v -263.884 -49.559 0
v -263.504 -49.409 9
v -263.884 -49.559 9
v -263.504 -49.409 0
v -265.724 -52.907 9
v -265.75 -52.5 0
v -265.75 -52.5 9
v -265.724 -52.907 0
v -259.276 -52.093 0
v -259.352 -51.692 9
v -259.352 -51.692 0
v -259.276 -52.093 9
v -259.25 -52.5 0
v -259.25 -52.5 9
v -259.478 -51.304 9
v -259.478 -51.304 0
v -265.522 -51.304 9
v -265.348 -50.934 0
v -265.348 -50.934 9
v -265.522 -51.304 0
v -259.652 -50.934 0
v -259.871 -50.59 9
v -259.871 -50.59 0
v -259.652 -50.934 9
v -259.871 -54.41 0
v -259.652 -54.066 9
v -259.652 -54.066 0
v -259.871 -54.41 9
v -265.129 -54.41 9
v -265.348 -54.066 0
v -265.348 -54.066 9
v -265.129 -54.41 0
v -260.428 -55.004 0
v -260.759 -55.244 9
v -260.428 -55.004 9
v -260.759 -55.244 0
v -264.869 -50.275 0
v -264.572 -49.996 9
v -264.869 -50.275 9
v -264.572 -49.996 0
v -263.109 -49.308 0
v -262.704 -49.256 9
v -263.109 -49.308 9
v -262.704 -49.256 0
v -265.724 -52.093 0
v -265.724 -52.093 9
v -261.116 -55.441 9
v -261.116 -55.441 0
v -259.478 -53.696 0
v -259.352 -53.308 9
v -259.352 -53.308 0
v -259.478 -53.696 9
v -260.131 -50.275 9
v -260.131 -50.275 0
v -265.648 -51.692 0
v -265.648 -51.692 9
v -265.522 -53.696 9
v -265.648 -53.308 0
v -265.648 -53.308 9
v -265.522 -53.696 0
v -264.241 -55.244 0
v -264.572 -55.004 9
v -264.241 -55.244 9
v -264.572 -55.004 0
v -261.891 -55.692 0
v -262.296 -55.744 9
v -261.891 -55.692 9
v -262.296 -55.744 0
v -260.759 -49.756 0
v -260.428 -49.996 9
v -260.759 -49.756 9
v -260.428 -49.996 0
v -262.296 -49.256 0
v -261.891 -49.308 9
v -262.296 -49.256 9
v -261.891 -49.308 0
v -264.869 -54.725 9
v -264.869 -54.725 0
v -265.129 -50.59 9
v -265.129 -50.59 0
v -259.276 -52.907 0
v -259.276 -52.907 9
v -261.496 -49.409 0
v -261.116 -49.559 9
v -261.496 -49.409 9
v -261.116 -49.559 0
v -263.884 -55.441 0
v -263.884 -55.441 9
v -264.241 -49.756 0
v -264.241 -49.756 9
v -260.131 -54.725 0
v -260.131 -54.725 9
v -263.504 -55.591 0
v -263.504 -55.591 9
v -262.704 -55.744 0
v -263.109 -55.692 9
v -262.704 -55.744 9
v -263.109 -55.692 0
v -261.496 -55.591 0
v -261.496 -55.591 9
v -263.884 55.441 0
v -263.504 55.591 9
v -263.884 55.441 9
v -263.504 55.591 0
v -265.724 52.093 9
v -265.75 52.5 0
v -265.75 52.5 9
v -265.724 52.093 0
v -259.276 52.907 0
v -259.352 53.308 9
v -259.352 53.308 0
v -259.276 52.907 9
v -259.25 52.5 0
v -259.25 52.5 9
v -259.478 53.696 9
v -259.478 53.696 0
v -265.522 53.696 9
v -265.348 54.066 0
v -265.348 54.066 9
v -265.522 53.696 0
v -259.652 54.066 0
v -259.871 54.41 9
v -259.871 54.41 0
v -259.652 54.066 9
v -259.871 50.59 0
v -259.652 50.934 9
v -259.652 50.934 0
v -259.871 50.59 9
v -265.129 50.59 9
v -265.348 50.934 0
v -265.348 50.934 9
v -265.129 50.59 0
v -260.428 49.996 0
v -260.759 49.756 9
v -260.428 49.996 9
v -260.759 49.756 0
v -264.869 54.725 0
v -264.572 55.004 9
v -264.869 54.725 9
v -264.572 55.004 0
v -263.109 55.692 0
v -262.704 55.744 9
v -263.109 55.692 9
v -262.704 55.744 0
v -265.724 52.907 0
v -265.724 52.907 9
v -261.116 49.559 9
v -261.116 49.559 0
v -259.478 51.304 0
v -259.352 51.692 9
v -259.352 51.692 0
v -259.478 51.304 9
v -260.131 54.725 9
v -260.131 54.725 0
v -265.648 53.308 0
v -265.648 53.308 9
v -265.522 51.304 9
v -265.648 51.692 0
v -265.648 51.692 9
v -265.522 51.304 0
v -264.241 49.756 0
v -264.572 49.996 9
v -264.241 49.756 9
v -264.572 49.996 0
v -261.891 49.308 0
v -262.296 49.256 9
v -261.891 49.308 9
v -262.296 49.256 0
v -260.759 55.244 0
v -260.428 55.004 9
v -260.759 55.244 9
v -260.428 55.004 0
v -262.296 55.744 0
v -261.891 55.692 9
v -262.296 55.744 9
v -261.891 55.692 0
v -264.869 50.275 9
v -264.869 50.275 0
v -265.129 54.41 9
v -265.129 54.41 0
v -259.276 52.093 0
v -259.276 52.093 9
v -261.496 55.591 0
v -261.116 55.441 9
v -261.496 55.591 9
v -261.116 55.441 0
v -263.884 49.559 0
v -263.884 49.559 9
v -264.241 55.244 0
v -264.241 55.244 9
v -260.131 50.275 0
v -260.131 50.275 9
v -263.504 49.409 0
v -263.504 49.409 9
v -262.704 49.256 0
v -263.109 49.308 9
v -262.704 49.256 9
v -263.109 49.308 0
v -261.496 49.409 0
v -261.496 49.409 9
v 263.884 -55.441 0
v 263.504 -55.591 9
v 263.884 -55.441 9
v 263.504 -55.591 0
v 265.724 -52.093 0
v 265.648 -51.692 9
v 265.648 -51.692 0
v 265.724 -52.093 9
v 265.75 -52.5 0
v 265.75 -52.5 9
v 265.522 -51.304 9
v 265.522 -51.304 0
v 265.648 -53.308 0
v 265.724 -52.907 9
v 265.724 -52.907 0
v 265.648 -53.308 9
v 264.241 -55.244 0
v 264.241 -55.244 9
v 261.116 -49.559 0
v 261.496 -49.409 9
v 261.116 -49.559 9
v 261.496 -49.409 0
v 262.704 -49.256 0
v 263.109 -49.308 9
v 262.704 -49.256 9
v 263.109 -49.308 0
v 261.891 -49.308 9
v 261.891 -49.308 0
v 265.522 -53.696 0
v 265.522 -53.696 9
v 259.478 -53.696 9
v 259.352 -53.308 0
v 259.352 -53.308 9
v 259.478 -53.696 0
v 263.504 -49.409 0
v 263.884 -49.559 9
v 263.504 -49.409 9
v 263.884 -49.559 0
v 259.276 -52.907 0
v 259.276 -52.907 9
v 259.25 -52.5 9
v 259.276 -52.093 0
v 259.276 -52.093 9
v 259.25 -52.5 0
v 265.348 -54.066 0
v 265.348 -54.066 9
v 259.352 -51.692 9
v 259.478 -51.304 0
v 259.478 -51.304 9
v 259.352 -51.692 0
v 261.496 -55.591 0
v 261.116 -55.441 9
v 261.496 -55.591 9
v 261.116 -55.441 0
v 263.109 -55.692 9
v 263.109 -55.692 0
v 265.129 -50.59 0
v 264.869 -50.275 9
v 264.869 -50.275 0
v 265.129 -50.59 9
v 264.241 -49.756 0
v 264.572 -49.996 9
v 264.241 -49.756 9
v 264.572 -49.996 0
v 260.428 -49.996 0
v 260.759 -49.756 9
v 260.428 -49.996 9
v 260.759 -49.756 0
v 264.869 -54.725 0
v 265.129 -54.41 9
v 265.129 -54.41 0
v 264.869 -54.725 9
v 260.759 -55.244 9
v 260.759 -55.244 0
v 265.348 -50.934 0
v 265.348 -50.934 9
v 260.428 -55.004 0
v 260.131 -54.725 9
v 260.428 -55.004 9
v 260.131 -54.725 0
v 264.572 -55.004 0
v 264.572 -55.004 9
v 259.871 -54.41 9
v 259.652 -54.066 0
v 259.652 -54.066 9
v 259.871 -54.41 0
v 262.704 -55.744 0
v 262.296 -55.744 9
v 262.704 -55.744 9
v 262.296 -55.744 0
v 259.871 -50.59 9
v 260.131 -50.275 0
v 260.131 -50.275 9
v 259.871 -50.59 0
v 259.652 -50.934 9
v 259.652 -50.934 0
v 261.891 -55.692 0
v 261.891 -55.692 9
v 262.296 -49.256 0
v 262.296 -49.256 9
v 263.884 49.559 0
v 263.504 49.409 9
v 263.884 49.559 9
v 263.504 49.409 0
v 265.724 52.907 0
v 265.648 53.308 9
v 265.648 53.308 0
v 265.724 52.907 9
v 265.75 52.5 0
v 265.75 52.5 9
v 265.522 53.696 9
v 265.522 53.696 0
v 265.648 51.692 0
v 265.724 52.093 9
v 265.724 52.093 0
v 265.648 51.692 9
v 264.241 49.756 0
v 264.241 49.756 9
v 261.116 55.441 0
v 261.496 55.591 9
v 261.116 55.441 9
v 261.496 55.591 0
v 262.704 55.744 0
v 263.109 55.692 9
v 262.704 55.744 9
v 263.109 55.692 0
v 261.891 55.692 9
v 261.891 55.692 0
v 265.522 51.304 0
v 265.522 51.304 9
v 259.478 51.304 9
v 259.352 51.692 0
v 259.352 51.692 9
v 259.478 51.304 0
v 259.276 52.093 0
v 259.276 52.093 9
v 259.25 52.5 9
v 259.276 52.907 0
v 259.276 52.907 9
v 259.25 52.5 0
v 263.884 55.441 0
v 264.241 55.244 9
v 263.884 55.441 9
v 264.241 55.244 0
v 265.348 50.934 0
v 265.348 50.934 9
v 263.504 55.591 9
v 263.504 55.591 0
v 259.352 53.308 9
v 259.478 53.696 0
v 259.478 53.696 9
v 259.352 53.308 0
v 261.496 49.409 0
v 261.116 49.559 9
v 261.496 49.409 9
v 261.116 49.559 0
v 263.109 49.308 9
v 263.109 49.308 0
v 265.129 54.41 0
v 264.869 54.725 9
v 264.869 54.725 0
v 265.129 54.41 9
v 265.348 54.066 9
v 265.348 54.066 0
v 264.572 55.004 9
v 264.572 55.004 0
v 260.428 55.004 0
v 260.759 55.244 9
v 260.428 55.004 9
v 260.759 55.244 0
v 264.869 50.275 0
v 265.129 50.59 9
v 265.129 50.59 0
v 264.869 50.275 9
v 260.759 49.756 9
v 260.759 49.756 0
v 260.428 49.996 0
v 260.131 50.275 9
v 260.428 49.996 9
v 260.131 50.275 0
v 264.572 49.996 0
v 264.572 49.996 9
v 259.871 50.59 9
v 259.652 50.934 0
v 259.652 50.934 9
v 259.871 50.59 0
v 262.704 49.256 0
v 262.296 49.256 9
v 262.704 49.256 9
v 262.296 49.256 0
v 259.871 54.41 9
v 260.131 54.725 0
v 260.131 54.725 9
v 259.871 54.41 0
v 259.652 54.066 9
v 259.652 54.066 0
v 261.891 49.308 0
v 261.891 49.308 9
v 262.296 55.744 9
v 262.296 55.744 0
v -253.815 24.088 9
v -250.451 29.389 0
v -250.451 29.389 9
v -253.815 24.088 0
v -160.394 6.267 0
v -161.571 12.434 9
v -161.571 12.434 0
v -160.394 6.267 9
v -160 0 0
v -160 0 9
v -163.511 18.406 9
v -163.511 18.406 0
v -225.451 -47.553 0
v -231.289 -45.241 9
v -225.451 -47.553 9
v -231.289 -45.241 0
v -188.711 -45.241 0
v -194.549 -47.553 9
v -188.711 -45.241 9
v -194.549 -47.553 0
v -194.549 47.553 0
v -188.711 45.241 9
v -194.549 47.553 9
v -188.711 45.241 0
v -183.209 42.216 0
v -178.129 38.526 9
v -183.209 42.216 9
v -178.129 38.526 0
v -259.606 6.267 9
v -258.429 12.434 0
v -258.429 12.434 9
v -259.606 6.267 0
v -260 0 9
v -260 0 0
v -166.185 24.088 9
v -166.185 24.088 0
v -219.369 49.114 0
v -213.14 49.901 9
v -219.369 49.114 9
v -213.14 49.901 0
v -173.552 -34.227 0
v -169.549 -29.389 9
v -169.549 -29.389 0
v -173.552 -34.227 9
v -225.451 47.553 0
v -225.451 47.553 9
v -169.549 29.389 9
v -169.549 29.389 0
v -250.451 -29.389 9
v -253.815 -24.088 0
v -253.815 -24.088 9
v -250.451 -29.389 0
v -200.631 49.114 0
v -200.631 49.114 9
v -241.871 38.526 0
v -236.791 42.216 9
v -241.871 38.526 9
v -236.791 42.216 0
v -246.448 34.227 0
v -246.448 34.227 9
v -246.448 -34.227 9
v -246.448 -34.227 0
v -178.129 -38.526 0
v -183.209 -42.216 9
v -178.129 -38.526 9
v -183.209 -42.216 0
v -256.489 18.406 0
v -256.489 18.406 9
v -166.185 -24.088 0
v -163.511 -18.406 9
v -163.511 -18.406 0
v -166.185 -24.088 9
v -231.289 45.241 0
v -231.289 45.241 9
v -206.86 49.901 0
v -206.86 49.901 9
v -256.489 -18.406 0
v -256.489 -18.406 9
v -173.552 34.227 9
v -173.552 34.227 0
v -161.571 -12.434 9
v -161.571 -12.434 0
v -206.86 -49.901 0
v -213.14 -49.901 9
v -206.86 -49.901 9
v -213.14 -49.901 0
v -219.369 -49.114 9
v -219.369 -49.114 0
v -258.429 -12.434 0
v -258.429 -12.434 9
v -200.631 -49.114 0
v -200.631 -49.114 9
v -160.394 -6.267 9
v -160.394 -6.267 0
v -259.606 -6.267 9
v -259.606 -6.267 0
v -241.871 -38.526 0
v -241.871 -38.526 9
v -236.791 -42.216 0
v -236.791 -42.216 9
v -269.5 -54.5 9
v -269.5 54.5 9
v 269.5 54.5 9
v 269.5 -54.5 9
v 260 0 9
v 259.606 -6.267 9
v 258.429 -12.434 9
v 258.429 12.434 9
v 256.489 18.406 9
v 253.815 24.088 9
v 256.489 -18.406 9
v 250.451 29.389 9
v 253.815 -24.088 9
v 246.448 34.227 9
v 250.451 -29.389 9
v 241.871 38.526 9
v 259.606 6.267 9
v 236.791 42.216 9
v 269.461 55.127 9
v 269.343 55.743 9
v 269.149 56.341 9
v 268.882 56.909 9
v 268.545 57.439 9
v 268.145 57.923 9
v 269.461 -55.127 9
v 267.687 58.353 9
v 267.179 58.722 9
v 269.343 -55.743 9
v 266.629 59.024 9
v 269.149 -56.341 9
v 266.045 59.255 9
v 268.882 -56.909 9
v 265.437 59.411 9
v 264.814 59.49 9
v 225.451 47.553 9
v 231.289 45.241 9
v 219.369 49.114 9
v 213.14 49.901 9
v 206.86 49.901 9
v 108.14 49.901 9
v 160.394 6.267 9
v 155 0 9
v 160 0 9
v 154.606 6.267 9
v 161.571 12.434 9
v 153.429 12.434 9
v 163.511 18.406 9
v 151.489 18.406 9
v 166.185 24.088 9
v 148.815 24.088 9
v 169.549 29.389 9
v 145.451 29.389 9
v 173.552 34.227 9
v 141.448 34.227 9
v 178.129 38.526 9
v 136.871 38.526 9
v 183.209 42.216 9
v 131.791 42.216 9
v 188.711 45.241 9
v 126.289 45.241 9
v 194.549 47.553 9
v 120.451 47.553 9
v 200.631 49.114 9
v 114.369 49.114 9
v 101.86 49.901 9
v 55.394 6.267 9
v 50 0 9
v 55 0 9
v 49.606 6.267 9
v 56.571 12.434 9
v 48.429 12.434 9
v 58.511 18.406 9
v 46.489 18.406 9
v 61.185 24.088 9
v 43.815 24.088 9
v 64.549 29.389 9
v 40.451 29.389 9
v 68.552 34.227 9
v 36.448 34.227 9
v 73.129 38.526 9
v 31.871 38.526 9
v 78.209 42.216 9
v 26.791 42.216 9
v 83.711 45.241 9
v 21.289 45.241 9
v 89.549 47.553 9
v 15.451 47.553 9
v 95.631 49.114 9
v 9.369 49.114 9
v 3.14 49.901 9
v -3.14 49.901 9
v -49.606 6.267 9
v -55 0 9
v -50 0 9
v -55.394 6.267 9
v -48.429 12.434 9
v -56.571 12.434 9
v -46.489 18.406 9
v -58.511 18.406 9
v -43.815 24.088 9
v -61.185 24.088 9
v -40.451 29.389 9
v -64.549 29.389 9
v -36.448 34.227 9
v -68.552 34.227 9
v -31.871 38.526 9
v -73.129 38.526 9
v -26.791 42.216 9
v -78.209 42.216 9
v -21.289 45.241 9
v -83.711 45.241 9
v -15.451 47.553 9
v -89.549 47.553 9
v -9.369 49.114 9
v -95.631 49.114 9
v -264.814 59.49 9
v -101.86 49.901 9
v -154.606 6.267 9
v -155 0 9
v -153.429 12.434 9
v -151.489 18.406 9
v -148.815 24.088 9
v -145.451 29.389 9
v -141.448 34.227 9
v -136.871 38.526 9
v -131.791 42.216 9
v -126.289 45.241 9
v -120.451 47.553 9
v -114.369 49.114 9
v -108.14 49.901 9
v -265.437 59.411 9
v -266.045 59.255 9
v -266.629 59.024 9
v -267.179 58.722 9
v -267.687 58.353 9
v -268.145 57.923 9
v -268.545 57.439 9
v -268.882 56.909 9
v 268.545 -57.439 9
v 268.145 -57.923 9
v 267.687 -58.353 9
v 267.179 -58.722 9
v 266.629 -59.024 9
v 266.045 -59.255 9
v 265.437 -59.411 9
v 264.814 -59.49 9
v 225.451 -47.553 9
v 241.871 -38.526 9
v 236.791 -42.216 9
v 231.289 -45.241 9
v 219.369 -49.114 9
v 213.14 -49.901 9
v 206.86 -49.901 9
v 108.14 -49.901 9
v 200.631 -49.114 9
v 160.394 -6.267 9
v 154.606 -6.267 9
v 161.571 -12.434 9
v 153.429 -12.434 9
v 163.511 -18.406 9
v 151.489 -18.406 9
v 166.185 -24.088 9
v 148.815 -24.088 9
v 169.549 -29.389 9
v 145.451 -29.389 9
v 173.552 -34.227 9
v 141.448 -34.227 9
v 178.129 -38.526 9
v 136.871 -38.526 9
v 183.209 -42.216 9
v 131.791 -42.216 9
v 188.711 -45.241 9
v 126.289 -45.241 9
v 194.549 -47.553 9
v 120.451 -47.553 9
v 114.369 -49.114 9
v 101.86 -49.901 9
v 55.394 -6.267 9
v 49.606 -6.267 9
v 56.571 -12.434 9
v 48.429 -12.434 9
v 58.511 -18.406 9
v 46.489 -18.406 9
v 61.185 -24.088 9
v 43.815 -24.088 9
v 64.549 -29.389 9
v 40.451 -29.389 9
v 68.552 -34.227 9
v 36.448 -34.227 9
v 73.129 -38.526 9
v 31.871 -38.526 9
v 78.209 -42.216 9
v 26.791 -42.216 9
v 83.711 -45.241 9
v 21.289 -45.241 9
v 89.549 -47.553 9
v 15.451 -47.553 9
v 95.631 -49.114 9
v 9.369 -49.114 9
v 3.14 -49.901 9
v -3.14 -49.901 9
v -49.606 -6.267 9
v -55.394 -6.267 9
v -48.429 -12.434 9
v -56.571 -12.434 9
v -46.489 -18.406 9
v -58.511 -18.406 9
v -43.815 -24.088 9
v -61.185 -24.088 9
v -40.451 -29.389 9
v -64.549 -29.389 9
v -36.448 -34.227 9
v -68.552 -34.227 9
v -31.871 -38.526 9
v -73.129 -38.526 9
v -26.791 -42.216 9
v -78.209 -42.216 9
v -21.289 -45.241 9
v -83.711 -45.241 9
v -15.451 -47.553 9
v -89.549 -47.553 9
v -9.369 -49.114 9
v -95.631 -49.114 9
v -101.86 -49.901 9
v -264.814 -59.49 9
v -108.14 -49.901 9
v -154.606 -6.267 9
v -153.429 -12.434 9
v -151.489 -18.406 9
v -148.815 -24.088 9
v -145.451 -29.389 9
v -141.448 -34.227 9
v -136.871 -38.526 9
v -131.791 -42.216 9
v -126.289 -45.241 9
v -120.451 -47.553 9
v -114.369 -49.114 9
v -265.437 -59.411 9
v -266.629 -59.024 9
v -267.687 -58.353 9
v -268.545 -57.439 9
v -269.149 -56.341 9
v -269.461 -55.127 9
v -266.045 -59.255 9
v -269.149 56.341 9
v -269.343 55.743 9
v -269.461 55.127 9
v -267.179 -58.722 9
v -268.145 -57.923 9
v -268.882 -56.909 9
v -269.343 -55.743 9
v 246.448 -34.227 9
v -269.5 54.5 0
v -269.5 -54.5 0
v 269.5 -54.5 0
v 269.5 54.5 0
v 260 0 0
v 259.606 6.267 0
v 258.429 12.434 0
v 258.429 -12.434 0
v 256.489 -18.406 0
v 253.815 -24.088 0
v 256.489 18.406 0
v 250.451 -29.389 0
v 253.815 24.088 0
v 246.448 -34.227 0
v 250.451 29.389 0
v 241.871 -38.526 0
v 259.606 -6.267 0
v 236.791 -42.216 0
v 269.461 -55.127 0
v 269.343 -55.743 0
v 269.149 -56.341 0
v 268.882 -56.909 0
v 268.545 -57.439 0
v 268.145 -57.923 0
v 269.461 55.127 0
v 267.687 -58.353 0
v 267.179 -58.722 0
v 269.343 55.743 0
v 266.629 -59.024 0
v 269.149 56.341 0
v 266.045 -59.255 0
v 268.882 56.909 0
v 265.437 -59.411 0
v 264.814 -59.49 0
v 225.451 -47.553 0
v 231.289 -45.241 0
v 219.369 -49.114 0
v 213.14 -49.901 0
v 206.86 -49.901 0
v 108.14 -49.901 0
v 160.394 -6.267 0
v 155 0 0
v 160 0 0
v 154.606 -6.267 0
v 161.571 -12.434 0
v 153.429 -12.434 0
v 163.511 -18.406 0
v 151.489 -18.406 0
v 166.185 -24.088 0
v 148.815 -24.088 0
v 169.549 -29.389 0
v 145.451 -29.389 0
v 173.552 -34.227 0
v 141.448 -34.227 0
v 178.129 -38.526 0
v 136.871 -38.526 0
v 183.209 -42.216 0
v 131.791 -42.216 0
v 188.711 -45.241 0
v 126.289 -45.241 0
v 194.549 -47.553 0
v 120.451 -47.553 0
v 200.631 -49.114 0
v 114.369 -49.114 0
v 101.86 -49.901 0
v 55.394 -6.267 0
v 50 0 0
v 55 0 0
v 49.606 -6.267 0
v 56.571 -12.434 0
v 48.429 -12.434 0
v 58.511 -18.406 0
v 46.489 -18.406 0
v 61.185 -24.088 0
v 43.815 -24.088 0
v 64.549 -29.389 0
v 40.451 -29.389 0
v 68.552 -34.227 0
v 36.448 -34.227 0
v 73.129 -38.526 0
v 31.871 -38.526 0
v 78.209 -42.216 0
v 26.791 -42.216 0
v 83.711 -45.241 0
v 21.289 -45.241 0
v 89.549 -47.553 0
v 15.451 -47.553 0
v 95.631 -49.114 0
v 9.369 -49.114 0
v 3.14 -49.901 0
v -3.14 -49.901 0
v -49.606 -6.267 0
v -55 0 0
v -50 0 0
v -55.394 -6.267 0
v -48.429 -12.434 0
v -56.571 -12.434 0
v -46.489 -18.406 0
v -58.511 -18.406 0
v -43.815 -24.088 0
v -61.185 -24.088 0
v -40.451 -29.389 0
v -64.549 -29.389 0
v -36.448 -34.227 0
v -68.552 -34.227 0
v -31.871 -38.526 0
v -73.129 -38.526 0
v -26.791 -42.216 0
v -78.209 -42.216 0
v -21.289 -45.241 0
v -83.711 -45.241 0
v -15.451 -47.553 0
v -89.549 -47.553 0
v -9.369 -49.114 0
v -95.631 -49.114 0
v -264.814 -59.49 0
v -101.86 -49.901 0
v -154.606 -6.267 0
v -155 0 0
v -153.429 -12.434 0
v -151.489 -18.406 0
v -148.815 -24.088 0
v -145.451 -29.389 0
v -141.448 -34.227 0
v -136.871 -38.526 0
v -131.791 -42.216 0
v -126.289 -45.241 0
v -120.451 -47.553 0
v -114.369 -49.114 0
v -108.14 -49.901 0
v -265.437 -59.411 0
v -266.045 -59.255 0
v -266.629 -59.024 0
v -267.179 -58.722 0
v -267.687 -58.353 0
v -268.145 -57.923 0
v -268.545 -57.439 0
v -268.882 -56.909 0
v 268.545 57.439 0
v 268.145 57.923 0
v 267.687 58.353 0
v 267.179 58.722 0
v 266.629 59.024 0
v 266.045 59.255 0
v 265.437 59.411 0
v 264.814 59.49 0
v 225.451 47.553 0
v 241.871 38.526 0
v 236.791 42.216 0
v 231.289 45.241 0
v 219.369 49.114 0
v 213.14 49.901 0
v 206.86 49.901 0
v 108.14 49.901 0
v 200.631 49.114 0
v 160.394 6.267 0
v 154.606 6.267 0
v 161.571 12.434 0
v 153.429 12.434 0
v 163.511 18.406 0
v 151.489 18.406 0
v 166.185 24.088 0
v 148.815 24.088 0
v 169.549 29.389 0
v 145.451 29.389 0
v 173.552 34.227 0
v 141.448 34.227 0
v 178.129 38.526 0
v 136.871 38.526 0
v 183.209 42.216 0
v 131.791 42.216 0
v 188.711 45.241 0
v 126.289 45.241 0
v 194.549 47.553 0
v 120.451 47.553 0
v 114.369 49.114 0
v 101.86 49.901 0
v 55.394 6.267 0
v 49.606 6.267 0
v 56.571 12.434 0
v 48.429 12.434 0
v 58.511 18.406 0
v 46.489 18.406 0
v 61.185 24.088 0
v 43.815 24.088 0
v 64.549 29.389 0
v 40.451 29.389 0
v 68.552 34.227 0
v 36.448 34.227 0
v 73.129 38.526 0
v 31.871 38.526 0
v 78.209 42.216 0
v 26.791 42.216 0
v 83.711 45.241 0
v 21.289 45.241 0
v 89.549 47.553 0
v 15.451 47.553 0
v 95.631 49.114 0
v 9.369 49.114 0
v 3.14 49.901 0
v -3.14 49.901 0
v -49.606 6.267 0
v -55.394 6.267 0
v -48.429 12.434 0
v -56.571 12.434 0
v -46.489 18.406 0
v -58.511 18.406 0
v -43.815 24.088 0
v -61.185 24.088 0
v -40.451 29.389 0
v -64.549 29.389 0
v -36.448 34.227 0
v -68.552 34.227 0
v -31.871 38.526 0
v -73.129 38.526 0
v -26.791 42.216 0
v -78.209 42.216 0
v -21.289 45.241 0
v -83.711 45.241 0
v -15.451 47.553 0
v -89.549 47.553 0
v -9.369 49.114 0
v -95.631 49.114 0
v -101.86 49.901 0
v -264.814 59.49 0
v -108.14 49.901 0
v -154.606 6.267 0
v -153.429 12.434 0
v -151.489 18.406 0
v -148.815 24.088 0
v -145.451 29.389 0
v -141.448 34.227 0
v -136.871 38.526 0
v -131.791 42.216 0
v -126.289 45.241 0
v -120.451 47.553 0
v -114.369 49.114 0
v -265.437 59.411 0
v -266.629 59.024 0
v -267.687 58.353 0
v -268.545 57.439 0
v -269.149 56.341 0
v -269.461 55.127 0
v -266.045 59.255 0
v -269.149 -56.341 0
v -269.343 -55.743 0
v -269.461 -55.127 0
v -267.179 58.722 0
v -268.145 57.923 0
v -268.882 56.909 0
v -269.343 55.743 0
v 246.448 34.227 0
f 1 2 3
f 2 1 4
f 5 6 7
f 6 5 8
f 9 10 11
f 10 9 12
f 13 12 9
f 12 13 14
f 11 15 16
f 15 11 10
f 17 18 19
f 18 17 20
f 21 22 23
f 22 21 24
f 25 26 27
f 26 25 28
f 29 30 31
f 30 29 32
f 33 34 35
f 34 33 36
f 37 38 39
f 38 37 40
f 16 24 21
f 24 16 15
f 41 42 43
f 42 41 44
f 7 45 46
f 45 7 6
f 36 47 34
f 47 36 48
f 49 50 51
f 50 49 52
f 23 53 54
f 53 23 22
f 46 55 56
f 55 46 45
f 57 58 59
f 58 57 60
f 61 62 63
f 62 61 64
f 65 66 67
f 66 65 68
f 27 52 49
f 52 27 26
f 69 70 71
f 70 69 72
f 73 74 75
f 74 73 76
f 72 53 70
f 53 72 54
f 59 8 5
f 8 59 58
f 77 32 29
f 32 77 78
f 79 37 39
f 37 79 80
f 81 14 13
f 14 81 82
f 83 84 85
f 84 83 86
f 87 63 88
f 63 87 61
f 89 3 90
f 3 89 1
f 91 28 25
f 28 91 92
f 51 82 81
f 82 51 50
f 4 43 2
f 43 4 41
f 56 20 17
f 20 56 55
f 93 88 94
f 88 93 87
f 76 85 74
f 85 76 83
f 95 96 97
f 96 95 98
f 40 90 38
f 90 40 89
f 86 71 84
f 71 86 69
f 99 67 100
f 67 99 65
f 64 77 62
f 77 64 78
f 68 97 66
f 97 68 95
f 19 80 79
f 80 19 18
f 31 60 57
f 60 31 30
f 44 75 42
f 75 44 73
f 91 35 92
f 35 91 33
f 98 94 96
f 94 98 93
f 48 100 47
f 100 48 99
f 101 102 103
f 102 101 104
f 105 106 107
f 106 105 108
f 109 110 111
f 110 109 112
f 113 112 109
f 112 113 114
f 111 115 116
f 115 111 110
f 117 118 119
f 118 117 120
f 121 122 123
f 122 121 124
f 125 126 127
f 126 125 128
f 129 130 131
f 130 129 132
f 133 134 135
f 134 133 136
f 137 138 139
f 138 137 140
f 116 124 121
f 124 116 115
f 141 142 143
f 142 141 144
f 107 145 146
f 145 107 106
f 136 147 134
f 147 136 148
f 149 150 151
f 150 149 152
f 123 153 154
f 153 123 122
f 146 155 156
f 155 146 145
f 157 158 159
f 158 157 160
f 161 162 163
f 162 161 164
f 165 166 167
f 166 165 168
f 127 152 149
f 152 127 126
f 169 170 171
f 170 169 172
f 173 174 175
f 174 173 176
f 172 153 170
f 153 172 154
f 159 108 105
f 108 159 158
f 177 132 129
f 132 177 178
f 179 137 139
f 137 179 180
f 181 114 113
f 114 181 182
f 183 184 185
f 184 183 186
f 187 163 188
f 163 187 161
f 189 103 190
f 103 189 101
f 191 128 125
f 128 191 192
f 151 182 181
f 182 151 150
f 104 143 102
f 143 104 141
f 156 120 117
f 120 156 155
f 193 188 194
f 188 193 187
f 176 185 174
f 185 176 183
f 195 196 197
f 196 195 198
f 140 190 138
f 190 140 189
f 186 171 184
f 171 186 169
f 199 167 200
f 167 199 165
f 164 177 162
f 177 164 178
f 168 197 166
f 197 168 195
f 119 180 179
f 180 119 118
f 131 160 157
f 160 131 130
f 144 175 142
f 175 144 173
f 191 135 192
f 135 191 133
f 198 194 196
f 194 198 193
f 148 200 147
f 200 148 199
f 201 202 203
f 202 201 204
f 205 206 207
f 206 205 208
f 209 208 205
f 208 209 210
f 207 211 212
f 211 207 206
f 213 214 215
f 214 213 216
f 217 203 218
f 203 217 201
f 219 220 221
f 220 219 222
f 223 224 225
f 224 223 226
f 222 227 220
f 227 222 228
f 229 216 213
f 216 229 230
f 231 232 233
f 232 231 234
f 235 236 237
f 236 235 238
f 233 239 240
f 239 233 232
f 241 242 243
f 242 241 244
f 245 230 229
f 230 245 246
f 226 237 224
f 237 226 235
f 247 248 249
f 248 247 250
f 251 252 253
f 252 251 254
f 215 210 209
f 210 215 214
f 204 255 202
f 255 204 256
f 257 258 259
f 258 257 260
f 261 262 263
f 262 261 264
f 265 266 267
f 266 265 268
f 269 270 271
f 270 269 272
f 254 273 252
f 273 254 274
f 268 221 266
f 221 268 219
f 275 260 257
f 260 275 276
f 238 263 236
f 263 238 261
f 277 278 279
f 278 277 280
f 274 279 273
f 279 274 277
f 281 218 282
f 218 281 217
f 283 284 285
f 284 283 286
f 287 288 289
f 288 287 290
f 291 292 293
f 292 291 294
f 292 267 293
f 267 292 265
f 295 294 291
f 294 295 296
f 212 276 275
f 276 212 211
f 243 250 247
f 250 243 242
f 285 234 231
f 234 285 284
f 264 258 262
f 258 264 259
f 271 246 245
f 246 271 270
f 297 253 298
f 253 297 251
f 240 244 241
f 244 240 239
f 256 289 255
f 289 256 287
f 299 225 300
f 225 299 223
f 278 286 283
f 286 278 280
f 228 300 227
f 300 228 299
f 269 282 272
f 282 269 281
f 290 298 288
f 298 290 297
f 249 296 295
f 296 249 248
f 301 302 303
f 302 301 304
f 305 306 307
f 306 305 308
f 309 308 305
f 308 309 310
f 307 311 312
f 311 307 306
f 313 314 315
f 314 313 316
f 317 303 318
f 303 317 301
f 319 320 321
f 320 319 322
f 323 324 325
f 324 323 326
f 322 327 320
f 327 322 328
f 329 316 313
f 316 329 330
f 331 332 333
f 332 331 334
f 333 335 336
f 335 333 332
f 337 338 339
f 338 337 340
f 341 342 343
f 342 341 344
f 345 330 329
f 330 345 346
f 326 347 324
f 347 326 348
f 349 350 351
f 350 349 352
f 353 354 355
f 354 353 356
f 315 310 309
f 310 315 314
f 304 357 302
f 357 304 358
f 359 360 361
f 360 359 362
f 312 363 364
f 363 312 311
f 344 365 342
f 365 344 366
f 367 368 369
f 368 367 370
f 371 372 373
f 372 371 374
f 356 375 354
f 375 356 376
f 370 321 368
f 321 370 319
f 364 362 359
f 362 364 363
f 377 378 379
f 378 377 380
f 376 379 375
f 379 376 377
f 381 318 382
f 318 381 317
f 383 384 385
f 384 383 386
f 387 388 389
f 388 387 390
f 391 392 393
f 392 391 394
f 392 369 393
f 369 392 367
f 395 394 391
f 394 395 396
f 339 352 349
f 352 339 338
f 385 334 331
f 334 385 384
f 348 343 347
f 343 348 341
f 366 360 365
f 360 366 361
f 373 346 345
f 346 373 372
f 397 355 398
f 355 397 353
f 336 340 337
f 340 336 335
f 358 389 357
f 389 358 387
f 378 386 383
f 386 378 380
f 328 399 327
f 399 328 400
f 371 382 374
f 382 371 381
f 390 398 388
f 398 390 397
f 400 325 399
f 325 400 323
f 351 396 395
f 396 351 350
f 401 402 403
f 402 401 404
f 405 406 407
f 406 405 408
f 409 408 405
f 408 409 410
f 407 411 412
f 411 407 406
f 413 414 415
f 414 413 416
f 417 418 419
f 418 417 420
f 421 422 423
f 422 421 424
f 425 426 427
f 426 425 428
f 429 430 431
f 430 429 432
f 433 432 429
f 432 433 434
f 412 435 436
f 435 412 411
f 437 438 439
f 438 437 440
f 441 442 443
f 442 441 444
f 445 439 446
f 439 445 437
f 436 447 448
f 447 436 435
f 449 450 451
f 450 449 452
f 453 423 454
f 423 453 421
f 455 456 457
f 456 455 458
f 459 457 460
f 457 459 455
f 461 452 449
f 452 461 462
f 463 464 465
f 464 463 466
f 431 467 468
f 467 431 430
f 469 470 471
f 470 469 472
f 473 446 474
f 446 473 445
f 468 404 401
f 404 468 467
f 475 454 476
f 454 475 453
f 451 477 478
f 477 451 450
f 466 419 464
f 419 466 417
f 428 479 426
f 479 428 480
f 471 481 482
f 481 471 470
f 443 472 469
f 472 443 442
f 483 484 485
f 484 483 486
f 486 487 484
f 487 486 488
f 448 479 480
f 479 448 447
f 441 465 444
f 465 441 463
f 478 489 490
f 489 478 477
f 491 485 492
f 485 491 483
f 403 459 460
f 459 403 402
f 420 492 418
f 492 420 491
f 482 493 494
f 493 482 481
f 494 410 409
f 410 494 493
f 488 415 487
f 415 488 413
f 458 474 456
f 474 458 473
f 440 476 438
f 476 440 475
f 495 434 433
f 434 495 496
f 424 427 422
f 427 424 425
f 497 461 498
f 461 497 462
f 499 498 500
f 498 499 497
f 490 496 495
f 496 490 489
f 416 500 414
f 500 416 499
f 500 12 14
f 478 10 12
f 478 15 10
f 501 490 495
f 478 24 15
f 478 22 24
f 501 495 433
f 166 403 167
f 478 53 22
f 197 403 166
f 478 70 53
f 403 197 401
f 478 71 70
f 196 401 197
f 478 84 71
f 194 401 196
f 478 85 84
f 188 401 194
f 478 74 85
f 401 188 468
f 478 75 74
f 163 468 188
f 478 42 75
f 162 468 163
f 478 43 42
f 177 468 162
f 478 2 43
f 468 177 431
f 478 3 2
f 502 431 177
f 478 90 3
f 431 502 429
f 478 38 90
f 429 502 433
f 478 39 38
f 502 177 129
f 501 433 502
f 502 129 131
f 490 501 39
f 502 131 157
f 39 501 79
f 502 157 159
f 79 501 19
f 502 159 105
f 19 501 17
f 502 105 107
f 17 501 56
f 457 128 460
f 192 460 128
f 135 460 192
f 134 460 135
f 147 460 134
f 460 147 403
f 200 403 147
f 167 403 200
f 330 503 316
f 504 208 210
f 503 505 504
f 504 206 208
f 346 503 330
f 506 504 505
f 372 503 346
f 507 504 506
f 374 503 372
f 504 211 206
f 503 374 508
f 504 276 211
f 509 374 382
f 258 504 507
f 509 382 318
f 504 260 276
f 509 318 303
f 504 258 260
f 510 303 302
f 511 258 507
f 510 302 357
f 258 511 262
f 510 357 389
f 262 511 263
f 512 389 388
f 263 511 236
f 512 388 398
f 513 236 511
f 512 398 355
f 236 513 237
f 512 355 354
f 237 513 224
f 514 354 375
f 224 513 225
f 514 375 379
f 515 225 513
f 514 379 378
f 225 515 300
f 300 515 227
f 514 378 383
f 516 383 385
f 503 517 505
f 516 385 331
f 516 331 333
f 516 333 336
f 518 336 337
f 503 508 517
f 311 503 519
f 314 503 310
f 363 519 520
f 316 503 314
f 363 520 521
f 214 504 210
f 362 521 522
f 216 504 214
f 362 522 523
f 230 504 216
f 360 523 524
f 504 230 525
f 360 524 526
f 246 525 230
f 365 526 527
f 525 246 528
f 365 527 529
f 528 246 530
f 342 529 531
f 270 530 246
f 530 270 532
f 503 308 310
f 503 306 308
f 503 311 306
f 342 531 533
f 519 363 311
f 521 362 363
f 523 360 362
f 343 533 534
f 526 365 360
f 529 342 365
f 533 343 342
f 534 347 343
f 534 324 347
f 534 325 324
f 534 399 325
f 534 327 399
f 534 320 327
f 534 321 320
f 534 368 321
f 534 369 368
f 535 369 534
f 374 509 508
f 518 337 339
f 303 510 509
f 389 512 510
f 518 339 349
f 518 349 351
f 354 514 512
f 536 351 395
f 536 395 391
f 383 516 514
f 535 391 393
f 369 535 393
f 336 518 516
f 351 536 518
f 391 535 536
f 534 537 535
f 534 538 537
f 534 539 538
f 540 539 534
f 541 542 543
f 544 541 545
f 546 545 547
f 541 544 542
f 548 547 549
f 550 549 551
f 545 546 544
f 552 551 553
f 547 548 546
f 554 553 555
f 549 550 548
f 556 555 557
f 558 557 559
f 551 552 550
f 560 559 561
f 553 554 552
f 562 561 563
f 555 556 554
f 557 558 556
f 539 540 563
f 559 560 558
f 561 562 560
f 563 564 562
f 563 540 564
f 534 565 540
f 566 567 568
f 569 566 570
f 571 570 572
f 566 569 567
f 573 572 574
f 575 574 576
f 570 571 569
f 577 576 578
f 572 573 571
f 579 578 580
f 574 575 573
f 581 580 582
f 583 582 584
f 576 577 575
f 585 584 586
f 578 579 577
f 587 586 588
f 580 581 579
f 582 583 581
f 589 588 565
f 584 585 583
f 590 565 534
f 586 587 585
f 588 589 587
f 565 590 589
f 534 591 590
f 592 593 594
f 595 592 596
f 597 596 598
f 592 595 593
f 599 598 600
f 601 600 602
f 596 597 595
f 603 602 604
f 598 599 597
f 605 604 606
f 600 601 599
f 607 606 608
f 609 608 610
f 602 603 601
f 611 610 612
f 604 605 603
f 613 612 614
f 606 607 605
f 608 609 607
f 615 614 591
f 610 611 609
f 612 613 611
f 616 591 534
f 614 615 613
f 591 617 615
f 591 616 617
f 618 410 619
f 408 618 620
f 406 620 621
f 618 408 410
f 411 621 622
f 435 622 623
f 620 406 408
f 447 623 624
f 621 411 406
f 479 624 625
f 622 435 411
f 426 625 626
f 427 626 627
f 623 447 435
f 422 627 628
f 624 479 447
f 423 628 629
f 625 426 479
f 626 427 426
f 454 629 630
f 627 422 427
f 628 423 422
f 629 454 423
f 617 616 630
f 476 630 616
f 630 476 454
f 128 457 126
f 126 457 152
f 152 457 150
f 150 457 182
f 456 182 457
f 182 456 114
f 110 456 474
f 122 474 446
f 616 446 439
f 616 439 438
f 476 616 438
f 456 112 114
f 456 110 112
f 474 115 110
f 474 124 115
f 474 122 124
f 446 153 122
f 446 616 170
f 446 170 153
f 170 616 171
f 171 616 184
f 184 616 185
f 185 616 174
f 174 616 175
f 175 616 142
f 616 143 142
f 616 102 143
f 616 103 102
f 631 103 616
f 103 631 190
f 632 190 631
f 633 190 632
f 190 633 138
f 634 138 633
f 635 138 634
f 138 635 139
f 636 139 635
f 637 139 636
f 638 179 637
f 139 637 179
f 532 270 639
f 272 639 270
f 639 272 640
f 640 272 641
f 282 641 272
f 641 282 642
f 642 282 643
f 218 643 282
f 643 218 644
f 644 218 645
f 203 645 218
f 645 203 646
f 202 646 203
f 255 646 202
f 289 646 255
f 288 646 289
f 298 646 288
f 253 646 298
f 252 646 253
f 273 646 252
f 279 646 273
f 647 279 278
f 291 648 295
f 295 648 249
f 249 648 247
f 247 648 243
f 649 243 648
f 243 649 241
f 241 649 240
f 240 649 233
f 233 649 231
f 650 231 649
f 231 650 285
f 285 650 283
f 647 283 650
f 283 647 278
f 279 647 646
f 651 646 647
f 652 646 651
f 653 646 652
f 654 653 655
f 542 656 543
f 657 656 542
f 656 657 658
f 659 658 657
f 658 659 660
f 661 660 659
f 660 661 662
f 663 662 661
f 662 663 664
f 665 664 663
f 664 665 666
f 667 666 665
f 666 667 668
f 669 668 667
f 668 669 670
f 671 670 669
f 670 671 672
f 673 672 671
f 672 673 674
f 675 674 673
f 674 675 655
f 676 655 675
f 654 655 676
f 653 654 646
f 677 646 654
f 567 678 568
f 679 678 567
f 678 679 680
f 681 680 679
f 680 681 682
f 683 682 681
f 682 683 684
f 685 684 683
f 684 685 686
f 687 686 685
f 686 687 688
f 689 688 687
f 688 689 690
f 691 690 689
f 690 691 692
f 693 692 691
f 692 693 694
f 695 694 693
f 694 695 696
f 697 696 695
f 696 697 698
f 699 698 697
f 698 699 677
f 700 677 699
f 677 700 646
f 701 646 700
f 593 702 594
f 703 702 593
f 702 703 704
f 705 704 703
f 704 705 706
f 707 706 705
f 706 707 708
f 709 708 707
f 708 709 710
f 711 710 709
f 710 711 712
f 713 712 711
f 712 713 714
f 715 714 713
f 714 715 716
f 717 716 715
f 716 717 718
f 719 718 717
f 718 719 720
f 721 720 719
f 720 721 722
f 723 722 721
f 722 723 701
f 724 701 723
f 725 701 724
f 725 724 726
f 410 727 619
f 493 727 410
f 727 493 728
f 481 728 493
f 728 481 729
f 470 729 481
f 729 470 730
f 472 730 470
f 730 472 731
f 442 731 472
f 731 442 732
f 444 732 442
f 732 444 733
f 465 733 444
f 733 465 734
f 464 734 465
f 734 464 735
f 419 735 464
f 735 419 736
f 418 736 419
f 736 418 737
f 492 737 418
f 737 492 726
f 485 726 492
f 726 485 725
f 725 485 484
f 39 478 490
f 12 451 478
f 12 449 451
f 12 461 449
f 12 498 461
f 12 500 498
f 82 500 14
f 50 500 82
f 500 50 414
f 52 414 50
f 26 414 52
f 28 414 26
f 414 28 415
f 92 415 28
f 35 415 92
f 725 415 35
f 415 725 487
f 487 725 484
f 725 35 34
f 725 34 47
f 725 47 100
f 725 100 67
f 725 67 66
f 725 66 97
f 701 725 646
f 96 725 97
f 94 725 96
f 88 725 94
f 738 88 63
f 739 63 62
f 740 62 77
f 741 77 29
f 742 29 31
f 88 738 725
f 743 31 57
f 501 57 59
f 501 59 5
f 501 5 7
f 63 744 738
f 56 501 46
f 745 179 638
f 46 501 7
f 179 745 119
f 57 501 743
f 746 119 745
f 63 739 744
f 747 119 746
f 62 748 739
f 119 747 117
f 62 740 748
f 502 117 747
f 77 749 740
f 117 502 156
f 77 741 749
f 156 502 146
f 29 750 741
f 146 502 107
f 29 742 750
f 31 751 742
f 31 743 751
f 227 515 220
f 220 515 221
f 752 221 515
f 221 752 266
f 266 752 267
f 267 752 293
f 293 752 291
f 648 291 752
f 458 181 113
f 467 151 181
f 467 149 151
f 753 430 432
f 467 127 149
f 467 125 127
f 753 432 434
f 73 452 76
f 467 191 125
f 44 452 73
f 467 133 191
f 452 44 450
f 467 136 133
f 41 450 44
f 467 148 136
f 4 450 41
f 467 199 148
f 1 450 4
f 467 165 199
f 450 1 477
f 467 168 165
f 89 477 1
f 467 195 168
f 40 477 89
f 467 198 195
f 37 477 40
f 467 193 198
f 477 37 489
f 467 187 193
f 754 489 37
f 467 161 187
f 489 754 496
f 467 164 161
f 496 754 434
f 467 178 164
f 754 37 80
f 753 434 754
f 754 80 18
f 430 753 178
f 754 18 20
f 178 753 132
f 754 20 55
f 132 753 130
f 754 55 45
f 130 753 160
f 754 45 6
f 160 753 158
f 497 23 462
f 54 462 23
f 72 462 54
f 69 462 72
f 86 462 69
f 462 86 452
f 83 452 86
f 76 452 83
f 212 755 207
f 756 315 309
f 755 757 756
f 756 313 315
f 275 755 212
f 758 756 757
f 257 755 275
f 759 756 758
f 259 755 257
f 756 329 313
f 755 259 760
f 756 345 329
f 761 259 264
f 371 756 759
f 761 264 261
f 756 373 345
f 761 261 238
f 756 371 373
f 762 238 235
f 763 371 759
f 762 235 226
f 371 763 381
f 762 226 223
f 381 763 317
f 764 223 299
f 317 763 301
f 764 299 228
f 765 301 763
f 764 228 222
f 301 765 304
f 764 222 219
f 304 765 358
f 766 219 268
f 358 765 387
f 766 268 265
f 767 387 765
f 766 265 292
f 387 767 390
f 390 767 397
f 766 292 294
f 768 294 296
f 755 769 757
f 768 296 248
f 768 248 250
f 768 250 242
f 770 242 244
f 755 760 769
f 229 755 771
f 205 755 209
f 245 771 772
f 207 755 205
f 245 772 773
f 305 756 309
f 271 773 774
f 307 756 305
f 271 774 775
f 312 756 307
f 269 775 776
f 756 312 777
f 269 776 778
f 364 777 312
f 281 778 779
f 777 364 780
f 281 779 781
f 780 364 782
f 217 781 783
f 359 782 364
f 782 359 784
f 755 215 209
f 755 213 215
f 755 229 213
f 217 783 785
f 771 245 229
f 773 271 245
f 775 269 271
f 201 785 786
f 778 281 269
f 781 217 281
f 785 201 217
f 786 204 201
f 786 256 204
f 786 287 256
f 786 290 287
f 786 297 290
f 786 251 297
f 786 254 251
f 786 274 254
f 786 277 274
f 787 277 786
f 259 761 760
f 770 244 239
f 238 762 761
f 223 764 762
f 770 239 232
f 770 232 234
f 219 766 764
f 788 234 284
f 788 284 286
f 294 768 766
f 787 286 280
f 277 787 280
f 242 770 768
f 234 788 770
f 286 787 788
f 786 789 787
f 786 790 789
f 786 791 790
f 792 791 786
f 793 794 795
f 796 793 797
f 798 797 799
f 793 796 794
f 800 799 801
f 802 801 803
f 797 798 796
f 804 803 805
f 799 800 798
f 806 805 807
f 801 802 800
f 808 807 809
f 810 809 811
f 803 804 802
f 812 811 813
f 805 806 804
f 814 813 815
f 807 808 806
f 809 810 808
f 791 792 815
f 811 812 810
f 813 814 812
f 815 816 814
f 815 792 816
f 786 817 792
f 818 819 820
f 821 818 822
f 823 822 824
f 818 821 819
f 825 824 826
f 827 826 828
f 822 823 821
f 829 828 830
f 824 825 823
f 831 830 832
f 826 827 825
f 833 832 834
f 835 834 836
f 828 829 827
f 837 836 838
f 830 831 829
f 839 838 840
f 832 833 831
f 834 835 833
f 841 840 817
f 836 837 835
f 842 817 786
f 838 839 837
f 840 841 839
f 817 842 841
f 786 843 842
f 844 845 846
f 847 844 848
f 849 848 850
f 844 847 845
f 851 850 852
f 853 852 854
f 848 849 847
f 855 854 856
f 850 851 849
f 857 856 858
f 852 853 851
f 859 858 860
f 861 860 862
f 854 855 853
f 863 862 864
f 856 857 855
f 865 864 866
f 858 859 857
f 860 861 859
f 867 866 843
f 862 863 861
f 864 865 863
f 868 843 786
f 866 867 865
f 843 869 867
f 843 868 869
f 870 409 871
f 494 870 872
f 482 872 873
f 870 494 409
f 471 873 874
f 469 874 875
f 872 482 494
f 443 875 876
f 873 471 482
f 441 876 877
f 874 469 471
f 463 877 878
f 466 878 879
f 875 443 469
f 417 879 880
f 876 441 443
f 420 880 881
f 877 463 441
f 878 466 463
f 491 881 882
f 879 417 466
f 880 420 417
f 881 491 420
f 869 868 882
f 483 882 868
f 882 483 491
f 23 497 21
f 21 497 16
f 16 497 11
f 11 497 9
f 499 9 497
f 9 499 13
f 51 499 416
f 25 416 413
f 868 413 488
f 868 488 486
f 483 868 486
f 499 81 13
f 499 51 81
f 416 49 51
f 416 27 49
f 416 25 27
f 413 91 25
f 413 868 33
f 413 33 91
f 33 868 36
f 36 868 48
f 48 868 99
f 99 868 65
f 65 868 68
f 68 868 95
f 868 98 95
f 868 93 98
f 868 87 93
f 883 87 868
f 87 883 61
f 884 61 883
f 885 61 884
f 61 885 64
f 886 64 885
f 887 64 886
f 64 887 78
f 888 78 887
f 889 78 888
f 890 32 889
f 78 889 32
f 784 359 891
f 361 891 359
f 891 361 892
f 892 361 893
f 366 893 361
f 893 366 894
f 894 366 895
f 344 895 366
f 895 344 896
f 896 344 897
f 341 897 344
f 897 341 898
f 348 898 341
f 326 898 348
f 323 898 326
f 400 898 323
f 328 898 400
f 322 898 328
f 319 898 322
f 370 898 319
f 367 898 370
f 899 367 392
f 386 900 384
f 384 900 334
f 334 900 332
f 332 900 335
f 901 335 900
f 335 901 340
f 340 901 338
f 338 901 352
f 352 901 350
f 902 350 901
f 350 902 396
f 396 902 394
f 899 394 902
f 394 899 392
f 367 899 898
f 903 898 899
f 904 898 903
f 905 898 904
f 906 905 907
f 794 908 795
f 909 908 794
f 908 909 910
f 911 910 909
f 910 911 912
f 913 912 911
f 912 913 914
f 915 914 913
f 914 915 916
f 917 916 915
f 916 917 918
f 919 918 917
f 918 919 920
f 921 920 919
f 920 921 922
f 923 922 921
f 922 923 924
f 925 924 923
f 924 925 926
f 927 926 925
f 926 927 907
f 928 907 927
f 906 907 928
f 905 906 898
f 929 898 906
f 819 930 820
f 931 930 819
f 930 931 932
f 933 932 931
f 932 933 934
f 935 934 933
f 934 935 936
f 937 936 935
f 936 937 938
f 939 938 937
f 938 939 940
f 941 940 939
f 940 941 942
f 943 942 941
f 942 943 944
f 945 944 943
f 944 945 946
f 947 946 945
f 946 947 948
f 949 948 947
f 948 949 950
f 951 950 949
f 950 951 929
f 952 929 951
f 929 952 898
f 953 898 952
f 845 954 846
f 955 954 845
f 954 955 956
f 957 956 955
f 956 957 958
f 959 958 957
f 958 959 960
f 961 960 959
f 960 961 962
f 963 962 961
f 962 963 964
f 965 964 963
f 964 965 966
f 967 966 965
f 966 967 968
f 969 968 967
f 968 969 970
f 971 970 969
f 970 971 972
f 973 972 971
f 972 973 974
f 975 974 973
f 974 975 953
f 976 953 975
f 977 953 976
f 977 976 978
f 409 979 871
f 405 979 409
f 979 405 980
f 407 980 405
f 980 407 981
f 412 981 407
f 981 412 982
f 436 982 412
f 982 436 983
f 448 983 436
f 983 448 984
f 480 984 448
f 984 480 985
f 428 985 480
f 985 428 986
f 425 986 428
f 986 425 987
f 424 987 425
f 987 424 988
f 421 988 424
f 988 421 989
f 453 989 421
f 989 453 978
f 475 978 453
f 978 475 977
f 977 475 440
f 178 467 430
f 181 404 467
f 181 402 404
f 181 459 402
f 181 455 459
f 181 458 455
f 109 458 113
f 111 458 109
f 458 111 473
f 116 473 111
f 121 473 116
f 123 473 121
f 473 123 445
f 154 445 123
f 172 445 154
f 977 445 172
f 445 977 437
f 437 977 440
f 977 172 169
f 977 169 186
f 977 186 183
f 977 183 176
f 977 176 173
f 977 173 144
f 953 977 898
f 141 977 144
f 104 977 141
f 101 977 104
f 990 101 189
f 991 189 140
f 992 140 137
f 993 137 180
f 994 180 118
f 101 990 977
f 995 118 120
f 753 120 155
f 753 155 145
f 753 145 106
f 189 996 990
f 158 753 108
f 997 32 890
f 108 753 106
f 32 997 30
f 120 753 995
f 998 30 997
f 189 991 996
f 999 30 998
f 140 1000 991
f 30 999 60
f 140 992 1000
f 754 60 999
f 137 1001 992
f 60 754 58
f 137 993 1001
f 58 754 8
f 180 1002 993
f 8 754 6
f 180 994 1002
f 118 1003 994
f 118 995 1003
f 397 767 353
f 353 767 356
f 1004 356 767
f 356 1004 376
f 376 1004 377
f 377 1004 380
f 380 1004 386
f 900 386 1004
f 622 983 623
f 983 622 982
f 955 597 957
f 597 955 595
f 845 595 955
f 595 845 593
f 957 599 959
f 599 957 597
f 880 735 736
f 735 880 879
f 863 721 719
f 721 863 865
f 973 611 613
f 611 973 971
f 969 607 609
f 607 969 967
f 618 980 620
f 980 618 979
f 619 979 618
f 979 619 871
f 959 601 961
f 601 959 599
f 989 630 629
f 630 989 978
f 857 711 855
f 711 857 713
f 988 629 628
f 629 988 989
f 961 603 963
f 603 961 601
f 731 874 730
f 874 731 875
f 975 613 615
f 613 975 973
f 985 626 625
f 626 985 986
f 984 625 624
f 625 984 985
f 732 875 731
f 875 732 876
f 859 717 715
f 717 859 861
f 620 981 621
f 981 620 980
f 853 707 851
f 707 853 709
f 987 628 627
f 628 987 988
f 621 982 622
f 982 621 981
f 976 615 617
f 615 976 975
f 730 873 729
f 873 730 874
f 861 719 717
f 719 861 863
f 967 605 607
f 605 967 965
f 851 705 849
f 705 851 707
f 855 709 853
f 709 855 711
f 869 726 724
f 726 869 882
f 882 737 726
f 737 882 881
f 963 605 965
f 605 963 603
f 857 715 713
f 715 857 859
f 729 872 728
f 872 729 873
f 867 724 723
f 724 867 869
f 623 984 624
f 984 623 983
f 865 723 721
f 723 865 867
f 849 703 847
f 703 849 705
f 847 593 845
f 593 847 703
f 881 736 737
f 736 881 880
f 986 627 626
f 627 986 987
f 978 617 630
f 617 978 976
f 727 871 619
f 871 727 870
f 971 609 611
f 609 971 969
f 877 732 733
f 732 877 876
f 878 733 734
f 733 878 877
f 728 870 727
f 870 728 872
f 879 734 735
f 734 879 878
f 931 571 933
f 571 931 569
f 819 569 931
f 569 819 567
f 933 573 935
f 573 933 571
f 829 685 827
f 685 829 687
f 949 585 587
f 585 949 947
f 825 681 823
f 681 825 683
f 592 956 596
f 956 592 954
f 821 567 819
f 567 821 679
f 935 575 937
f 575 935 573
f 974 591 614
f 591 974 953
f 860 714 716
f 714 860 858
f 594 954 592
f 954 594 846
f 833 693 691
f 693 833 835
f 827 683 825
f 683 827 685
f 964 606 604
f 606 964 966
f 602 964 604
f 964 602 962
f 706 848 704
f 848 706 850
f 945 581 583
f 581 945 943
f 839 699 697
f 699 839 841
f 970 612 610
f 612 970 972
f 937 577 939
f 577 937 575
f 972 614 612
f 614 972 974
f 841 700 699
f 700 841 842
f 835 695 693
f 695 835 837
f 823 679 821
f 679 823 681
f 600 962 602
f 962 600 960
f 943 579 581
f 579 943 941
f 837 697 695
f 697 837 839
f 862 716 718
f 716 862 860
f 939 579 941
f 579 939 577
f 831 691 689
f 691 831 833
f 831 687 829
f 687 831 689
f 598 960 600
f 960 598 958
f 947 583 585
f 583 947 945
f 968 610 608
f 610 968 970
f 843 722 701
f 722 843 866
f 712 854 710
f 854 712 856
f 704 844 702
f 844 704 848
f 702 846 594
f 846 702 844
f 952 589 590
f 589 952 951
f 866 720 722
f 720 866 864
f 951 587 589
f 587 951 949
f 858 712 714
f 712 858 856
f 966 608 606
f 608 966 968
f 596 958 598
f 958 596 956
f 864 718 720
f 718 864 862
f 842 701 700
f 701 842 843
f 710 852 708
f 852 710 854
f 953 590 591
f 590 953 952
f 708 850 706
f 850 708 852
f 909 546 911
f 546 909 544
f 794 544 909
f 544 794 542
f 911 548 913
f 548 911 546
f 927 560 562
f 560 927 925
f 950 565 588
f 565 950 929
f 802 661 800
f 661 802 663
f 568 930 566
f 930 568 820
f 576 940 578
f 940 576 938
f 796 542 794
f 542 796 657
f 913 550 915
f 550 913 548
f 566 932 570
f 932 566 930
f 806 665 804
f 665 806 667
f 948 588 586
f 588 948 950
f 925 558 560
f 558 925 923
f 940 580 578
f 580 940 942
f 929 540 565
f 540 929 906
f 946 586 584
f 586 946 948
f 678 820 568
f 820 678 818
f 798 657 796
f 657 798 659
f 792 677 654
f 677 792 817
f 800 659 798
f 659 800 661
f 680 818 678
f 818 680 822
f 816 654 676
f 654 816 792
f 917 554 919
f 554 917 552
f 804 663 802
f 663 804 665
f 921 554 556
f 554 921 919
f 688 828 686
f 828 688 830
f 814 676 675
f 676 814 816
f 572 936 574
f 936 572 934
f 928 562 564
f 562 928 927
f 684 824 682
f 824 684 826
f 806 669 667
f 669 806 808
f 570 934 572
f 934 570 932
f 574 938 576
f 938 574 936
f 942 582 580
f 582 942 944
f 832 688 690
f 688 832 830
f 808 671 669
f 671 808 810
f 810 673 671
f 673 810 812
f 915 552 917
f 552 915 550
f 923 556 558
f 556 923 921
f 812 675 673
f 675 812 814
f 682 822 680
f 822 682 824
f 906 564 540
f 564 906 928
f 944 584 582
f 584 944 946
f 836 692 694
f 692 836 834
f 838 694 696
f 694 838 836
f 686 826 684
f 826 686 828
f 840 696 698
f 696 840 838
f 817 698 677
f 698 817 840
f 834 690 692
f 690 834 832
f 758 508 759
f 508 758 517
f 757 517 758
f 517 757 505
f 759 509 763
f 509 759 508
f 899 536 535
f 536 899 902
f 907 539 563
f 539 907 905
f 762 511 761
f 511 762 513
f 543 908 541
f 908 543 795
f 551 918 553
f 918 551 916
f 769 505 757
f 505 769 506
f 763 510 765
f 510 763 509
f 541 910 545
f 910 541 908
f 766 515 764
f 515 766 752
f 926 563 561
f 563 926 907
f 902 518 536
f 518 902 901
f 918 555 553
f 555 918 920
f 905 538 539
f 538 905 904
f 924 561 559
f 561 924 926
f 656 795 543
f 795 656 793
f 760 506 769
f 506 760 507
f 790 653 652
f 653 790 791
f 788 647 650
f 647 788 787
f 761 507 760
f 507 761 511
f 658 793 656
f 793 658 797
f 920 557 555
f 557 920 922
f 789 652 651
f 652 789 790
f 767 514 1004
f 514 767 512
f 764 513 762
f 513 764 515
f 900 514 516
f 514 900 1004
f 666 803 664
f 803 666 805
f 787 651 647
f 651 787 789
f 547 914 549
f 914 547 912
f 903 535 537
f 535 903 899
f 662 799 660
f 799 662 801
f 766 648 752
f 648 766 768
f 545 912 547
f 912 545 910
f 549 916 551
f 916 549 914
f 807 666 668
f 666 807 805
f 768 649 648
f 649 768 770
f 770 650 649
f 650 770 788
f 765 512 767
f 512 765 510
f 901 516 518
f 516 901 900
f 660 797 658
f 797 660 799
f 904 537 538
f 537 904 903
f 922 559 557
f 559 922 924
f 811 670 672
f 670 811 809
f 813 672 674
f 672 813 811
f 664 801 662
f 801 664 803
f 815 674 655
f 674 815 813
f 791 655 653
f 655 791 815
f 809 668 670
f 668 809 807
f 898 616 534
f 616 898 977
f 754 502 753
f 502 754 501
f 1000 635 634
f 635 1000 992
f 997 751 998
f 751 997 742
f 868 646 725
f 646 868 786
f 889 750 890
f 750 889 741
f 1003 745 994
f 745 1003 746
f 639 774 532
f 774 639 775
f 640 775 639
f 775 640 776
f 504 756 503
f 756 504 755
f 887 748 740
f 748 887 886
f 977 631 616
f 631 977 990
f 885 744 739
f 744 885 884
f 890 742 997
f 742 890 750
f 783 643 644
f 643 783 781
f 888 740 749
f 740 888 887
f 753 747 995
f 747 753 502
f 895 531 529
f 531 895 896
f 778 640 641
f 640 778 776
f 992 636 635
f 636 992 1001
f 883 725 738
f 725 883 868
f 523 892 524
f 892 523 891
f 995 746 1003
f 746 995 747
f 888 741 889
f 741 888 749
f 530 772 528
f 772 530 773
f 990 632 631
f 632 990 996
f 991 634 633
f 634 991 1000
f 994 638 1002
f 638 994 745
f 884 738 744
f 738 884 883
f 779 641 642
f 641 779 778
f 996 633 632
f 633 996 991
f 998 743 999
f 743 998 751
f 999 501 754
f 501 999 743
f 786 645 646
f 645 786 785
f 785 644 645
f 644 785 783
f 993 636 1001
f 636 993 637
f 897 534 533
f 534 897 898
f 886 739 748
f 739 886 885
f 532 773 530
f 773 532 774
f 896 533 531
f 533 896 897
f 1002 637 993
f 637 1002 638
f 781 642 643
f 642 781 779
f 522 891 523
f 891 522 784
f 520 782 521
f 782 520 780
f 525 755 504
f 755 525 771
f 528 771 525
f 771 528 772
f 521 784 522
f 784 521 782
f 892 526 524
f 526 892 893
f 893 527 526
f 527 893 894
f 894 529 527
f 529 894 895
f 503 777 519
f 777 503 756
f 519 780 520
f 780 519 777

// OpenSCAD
$fn = 50;


difference() {
	union() {
		hull() {
			translate(v = [-264.5000000000, 54.5000000000, 0]) {
				cylinder(h = 9, r = 5);
			}
			translate(v = [264.5000000000, 54.5000000000, 0]) {
				cylinder(h = 9, r = 5);
			}
			translate(v = [-264.5000000000, -54.5000000000, 0]) {
				cylinder(h = 9, r = 5);
			}
			translate(v = [264.5000000000, -54.5000000000, 0]) {
				cylinder(h = 9, r = 5);
			}
		}
	}
	union() {
		#translate(v = [-262.5000000000, -52.5000000000, -100.0000000000]) {
			cylinder(h = 200, r = 3.2500000000);
		}
		#translate(v = [-262.5000000000, 52.5000000000, -100.0000000000]) {
			cylinder(h = 200, r = 3.2500000000);
		}
		#translate(v = [262.5000000000, -52.5000000000, -100.0000000000]) {
			cylinder(h = 200, r = 3.2500000000);
		}
		#translate(v = [262.5000000000, 52.5000000000, -100.0000000000]) {
			cylinder(h = 200, r = 3.2500000000);
		}
		#translate(v = [-210.0000000000, 0, 0]) {
			cylinder(h = 9, r = 50.0000000000);
		}
		#translate(v = [-105.0000000000, 0, 0]) {
			cylinder(h = 9, r = 50.0000000000);
		}
		#cylinder(h = 9, r = 50.0000000000);
		#translate(v = [105.0000000000, 0, 0]) {
			cylinder(h = 9, r = 50.0000000000);
		}
		#translate(v = [210.0000000000, 0, 0]) {
			cylinder(h = 9, r = 50.0000000000);
		}
	}
}
